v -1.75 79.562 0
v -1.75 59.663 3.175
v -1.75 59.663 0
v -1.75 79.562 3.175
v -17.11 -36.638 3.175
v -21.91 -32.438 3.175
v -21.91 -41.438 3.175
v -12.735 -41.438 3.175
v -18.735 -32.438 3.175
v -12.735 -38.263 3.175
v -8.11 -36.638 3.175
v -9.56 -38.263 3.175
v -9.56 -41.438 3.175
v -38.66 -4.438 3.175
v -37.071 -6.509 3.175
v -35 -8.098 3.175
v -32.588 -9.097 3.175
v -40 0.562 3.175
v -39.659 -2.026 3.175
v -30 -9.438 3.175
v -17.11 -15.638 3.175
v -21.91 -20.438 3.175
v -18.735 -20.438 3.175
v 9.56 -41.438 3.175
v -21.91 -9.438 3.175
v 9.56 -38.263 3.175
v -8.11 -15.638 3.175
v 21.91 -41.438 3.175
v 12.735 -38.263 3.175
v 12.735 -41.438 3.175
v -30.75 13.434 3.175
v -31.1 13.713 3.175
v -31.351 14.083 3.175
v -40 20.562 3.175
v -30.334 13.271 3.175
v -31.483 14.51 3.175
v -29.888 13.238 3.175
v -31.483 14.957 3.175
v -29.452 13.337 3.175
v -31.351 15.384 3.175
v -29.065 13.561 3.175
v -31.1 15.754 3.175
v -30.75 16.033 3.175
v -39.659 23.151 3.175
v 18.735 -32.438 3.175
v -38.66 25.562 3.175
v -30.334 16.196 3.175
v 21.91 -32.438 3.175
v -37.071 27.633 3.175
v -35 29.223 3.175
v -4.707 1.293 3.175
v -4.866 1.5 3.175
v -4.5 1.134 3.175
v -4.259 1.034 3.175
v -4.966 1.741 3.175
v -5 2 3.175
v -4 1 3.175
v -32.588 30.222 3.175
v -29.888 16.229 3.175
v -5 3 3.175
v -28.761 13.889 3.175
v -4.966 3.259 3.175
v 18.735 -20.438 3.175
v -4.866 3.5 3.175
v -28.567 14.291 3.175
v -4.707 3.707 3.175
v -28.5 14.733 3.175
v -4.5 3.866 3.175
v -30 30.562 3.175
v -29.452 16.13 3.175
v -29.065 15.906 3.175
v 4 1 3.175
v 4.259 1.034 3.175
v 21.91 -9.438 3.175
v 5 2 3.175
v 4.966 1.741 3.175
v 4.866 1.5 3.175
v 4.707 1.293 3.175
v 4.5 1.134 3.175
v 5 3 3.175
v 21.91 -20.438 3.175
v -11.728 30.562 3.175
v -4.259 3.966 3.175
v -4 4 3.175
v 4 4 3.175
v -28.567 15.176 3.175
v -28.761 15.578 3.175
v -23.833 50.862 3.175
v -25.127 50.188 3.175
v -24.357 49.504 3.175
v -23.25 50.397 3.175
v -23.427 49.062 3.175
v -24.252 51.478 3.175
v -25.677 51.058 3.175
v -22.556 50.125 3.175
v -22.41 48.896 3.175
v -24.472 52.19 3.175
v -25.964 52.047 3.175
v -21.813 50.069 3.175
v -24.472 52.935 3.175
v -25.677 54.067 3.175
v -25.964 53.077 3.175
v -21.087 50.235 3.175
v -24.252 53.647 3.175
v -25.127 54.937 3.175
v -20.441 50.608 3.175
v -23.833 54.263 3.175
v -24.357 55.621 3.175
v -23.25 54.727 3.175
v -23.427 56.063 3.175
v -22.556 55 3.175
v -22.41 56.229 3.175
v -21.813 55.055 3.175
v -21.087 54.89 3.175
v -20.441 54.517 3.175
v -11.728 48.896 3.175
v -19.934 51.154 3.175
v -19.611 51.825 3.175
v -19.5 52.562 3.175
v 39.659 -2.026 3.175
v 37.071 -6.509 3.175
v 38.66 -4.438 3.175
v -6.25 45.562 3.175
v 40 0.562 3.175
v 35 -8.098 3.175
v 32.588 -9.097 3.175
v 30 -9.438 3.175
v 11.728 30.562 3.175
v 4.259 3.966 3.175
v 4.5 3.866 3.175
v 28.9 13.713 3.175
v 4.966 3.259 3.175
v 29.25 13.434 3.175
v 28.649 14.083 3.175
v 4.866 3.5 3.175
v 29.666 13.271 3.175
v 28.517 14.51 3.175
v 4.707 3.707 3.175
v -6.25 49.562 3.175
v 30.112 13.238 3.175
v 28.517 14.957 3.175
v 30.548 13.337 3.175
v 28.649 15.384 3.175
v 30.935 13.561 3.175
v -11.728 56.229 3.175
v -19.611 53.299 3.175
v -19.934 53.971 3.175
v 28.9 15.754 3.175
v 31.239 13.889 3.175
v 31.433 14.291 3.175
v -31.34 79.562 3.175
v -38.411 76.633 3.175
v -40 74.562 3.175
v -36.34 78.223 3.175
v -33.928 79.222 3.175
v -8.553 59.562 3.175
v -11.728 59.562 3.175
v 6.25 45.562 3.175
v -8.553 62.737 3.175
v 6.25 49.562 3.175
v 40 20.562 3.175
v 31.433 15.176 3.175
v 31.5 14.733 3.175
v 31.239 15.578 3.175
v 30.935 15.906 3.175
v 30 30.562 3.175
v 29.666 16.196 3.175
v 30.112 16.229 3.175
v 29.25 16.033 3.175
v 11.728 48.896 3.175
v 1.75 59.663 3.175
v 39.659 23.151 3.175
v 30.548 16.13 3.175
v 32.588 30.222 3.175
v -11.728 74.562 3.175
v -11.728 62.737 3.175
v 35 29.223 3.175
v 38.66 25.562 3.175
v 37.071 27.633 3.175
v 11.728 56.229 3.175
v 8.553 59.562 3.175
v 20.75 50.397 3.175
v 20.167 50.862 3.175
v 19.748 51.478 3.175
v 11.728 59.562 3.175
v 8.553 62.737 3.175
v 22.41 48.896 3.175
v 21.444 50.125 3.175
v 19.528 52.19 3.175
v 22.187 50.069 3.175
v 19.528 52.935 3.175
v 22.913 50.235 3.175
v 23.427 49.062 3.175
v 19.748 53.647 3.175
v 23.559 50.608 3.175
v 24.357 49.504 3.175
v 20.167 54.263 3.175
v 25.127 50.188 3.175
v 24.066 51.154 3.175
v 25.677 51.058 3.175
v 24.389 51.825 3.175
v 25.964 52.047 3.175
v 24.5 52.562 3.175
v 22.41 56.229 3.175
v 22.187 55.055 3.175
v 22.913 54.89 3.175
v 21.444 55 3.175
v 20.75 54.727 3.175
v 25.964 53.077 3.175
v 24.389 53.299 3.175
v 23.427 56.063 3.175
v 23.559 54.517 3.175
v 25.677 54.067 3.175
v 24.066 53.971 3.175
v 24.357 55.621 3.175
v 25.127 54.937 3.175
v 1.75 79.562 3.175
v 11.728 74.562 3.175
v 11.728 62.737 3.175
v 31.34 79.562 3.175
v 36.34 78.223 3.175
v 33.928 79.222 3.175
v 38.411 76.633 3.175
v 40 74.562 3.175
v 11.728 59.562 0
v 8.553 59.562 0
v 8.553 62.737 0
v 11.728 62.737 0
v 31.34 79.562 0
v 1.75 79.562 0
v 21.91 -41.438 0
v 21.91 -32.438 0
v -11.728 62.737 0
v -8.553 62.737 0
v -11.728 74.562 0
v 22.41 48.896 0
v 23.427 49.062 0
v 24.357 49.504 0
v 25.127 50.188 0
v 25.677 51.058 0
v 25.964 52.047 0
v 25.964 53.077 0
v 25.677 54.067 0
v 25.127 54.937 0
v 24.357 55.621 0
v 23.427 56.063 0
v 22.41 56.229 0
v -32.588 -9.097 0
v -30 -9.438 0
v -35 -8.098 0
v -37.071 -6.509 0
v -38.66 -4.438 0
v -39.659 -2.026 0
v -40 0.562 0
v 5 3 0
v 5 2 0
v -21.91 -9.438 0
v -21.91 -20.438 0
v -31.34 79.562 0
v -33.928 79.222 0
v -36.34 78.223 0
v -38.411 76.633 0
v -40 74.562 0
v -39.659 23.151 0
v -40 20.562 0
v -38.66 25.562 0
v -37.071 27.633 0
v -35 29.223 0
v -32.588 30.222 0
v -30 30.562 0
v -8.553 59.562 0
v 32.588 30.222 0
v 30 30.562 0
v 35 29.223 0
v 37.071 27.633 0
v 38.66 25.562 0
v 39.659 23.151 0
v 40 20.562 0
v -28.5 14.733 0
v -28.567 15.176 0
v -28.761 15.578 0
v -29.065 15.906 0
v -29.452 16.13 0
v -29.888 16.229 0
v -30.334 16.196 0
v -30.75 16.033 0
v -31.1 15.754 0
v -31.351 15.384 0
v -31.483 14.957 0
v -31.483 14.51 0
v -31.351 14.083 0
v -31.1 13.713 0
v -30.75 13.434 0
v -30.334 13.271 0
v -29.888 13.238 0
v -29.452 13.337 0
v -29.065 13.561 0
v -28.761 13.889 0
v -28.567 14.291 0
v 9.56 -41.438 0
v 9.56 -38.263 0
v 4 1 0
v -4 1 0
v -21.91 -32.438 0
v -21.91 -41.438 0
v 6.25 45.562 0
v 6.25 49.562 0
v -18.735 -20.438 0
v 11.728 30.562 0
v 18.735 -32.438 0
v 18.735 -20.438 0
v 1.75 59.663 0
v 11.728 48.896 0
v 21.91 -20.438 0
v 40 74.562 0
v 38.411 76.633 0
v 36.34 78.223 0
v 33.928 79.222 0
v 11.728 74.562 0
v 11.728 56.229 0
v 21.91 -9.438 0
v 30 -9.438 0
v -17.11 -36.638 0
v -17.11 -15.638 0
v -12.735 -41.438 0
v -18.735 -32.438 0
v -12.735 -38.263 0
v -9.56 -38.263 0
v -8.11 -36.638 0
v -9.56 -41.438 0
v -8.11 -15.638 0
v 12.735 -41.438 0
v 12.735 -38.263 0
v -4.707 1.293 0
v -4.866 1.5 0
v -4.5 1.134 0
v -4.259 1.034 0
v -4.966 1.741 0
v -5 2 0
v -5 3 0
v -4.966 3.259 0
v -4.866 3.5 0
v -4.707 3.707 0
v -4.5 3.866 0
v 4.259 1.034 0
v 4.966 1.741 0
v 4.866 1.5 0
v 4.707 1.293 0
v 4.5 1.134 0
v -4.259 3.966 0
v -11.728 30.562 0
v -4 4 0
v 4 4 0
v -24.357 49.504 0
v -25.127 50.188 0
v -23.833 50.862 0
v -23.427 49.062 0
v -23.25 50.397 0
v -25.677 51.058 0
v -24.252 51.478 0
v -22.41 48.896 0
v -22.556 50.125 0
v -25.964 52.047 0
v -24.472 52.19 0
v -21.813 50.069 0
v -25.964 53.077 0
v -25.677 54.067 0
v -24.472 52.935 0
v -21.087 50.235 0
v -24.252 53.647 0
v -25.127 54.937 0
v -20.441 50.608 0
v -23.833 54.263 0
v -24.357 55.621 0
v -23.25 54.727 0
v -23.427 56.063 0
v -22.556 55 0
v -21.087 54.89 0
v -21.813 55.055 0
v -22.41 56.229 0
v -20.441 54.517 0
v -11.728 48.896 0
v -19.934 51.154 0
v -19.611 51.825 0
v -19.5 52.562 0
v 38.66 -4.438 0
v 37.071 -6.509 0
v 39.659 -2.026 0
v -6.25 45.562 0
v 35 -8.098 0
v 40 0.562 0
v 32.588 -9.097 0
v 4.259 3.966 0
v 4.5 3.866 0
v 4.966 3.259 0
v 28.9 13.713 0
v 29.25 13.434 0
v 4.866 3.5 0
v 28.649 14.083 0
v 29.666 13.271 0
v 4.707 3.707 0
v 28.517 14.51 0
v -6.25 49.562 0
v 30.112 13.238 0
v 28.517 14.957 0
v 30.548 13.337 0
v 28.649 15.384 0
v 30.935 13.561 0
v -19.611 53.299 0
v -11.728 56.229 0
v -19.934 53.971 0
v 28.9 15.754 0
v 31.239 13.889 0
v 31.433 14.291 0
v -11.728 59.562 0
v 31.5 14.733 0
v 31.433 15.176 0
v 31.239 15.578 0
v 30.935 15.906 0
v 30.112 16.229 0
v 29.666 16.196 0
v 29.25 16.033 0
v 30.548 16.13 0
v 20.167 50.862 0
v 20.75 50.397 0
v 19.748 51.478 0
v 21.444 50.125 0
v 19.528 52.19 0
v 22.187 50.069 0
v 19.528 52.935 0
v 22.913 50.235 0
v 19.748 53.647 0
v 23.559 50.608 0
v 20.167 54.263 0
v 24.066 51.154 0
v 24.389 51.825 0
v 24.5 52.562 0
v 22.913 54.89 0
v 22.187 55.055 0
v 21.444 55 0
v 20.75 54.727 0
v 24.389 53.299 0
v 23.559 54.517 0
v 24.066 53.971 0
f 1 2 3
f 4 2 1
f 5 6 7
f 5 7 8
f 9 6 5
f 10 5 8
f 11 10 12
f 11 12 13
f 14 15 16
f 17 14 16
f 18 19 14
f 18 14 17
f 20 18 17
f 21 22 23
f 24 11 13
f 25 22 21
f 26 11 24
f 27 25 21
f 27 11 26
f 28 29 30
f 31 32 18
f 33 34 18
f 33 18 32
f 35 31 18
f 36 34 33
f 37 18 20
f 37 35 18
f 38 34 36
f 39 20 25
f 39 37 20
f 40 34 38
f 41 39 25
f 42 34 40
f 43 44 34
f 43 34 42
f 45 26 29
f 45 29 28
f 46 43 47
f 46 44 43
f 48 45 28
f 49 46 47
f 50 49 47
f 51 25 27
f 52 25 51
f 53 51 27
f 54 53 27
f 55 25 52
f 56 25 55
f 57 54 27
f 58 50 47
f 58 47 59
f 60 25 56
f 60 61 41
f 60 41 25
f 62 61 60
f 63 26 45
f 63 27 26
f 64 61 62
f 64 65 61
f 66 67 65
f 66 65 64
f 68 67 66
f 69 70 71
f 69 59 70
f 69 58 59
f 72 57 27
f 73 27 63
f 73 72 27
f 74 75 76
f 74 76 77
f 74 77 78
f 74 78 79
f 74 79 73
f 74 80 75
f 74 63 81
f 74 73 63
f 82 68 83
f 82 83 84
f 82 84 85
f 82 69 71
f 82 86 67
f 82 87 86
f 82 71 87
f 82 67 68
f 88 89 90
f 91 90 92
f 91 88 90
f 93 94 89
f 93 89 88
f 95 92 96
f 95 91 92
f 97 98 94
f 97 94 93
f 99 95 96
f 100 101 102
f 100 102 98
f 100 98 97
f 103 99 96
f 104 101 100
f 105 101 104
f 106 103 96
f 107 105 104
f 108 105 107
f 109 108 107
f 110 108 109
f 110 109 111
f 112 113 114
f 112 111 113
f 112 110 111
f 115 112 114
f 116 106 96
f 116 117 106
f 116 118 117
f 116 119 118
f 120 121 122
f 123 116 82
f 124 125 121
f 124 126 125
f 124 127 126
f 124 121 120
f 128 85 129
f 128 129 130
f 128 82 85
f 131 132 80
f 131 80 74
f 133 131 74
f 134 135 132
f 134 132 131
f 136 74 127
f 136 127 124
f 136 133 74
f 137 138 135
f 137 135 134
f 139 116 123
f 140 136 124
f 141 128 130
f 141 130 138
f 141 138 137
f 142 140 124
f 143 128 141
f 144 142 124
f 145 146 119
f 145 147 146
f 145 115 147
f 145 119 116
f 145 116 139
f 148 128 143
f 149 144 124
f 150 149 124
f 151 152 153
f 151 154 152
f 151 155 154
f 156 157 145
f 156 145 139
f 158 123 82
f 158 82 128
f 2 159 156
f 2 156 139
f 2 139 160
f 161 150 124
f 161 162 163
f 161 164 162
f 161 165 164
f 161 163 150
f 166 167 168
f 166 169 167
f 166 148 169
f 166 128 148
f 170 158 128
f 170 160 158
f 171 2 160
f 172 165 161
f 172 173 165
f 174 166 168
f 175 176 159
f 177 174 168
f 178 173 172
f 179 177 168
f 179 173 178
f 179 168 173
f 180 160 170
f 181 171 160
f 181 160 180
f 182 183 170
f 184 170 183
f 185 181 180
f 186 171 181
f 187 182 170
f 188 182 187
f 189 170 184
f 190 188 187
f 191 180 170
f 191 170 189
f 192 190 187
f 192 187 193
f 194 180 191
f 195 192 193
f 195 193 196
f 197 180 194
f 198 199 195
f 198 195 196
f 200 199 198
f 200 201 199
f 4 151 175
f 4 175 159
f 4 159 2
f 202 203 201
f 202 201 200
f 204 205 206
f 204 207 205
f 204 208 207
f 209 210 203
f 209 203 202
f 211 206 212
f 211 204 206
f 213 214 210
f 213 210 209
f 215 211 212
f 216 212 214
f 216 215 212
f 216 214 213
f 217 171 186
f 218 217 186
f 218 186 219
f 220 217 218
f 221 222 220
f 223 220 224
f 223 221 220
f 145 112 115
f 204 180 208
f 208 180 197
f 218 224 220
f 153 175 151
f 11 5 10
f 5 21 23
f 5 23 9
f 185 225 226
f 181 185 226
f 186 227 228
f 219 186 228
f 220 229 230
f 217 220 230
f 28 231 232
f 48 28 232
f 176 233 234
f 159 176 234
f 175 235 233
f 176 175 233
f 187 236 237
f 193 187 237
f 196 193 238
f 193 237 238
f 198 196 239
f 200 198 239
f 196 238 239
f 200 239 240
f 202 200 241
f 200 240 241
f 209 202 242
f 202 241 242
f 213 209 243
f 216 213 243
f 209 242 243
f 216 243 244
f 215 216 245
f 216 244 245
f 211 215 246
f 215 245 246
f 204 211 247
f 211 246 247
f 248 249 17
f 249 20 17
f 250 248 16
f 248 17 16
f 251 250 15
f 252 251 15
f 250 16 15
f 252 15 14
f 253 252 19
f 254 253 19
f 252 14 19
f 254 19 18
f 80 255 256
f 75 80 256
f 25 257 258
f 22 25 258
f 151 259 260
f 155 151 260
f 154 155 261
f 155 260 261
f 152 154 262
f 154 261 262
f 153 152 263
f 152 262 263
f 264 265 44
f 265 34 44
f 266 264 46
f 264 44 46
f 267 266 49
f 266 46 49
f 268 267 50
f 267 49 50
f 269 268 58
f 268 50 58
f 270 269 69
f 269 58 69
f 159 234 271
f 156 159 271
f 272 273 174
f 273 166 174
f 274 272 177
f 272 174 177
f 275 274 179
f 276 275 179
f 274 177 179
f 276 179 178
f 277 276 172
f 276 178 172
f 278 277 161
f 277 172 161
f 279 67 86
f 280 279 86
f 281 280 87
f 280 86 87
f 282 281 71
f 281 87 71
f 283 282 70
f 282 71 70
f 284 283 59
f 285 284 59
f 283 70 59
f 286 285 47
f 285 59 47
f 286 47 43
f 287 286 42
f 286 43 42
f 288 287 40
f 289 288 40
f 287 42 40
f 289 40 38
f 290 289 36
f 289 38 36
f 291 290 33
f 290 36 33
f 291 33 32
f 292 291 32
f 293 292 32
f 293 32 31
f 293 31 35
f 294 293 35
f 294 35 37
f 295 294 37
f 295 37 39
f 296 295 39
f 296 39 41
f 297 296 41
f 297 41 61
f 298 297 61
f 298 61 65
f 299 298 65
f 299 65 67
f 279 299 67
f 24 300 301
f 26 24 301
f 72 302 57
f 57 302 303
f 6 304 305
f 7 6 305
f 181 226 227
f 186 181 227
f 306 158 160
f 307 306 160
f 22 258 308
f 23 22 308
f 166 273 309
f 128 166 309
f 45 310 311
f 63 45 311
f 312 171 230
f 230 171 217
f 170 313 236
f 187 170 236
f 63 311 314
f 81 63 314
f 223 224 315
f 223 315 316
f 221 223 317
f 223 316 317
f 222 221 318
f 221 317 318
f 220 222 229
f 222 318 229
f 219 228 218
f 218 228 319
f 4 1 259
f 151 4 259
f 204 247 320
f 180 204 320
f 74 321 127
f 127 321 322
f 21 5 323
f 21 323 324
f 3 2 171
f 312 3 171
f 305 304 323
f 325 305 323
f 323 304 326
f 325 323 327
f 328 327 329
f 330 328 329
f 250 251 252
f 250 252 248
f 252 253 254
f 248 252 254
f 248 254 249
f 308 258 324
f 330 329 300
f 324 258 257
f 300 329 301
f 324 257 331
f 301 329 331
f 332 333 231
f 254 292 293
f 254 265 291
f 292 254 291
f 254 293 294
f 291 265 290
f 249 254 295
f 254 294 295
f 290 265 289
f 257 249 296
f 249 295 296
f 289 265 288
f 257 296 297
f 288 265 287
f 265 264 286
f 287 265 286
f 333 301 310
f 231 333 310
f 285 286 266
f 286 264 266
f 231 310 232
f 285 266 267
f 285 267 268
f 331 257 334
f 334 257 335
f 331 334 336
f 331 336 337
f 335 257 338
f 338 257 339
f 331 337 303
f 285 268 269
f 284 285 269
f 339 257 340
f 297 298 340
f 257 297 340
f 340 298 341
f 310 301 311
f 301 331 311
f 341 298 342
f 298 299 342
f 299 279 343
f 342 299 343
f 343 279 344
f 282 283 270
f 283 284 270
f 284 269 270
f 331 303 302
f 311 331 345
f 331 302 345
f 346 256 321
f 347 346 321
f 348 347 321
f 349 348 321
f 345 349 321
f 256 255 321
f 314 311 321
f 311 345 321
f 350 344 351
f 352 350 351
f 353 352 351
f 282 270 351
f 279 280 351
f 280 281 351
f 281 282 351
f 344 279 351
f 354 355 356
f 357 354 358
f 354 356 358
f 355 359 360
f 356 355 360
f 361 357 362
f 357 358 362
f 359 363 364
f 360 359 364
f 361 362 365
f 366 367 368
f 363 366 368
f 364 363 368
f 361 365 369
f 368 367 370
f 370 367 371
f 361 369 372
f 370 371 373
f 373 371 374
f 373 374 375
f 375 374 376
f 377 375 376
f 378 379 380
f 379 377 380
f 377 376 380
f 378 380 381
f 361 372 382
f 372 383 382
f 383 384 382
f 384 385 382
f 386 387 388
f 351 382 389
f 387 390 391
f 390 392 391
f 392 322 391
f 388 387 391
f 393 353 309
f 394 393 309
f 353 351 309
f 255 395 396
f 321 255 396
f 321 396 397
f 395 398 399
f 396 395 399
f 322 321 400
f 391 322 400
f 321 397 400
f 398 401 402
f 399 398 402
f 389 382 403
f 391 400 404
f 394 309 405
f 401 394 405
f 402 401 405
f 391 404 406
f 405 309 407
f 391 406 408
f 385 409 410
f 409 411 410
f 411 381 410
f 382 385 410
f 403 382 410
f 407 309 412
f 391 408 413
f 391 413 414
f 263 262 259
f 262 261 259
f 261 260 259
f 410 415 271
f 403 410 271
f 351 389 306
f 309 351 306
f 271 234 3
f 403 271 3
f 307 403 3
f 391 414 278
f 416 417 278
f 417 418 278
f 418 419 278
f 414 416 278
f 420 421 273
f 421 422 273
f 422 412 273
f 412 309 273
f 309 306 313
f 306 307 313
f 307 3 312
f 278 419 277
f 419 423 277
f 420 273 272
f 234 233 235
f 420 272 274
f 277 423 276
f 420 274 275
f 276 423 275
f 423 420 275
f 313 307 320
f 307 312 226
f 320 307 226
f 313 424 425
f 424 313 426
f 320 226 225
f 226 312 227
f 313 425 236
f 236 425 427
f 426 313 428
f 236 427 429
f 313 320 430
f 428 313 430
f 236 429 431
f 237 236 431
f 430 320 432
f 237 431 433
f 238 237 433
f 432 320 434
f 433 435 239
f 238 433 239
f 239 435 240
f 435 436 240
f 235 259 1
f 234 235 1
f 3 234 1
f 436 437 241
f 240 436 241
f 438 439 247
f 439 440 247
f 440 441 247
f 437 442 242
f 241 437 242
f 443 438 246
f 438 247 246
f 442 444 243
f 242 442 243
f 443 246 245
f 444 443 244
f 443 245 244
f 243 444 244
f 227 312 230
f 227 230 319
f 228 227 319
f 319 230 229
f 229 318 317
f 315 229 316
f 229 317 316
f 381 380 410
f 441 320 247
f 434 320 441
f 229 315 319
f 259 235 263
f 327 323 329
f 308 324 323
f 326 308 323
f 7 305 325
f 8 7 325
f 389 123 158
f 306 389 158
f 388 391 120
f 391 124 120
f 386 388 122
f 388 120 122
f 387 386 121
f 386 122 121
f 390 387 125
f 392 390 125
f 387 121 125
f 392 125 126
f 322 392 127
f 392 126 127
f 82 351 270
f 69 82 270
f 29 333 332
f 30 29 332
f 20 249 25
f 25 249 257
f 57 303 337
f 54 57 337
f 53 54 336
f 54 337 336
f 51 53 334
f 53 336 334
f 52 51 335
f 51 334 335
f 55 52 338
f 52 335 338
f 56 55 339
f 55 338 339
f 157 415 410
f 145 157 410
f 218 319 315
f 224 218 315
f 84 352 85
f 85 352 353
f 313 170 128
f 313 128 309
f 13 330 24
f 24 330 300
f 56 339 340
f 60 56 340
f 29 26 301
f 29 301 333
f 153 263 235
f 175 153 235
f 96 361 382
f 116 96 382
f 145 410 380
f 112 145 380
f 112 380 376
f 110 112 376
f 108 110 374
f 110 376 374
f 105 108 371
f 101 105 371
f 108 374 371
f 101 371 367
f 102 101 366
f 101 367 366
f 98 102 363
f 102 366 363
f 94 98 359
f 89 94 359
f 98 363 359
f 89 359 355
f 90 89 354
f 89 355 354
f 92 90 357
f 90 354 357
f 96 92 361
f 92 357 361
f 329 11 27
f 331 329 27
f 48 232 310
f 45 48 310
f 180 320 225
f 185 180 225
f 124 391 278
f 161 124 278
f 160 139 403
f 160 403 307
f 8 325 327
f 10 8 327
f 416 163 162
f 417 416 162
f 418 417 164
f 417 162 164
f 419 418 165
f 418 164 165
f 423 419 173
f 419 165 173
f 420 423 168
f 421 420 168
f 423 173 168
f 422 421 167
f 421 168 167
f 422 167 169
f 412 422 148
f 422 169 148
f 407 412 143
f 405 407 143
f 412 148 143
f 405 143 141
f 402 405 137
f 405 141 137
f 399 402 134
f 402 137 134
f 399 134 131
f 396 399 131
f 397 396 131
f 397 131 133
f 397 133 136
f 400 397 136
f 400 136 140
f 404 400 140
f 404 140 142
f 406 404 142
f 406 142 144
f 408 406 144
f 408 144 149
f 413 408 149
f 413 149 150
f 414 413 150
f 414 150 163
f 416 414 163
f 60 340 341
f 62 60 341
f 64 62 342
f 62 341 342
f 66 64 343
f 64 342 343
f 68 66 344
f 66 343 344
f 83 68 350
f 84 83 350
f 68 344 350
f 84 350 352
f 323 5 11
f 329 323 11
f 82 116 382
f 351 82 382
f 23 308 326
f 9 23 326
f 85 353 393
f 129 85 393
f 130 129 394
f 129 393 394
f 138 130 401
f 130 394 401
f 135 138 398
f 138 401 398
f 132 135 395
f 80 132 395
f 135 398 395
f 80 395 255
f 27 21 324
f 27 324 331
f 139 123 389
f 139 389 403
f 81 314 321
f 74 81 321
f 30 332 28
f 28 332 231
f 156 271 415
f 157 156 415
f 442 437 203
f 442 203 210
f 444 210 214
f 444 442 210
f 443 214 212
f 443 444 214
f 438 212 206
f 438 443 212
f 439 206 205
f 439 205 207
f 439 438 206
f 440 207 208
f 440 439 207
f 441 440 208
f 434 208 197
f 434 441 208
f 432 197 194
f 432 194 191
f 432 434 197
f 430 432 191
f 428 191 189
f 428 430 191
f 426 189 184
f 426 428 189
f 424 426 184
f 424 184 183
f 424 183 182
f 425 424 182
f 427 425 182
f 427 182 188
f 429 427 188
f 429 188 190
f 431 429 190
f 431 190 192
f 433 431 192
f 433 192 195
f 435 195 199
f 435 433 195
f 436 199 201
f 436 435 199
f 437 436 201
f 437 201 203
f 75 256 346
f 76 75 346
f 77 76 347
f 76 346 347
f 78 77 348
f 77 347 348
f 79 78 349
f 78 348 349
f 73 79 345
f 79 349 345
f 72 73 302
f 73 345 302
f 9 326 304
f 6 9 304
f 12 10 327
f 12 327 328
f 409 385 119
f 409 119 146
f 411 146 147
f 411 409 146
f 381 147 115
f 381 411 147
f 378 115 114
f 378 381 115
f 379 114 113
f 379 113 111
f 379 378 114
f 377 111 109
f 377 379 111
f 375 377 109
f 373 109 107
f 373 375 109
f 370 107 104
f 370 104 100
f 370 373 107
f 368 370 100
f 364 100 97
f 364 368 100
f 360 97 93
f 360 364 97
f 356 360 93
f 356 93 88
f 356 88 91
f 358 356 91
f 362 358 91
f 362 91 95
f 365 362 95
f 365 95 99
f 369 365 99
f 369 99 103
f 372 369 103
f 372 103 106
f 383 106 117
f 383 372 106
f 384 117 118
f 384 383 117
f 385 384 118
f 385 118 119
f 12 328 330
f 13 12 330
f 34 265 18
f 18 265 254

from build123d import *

# Parameters (mm, degrees)
SKETCH1_R           = 2.5
BOSS_EXTRUDE1_DEPTH = 3.175
FILLET1_R           = 10
SKETCH2_W           = 9
SKETCH2_H           = 21
CUT_EXTRUDE1_DEPTH  = 90.108082017
SKETCH3_W           = 12.5
SKETCH3_H           = 4
SKETCH3_W_2         = 3.5
SKETCH3_H_2         = 20
CUT_EXTRUDE2_DEPTH  = 90.108082017
FILLET2_R           = 10
SKETCH4_W           = 3.175
SKETCH4_H           = 3.175
BOSS_EXTRUDE2_DEPTH = 29
SKETCH5_W           = 3.175
SKETCH5_H           = 3.175
BOSS_EXTRUDE3_DEPTH = 29
SKETCH7_R           = 1.5
CUT_EXTRUDE3_DEPTH  = 10


with BuildPart() as part:
    # Sketch1 → Boss-Extrude1 (new body)
    with BuildSketch(Plane.XY):
        with BuildLine():
            Line((-9.56, -38.262636689), (-9.56, -41.437636689))
            Line((-9.56, -41.437636689), (9.56, -41.437636689))
            Line((9.56, -41.437636689), (9.56, -38.262636689))
            Line((9.56, -38.262636689), (12.735, -38.262636689))
            Line((12.735, -38.262636689), (12.735, -41.437636689))
            Line((12.735, -41.437636689), (15.91, -41.437636689))
            Line((15.91, -41.437636689), (21.91, -41.437636689))
            Line((21.91, -41.437636689), (21.91, -32.437636689))
            Line((21.91, -32.437636689), (18.735, -32.437636689))
            Line((18.735, -32.437636689), (18.735, -20.437636689))
            Line((18.735, -20.437636689), (21.91, -20.437636689))
            Line((21.91, -20.437636689), (21.91, -9.437636689))
            Line((21.91, -9.437636689), (40, -9.437636689))
            Line((40, -9.437636689), (40, 30.562363311))
            Line((40, 30.562363311), (10, 30.562363311))
            Line((10, 30.562363311), (10, 45.562363311))
            Line((10, 45.562363311), (10, 48.89577614))
            Line((10, 48.89577614), (22.410269523, 48.89577614))
            ThreePointArc((22.410269523, 48.89577614), (26.000000001, 52.562363311), (22.410269523, 56.228950483))
            Line((22.410269523, 56.228950483), (11.727794547, 56.228950483))
            Line((11.727794547, 56.228950483), (11.727794547, 59.562363311))
            Line((11.727794547, 59.562363311), (10, 59.562363311))
            Line((10, 59.562363311), (8.552794547, 59.562363311))
            Line((8.552794547, 59.562363311), (8.552794547, 62.737363311))
            Line((8.552794547, 62.737363311), (11.727794547, 62.737363311))
            Line((11.727794547, 62.737363311), (11.727794547, 74.562363311))
            Line((11.727794547, 74.562363311), (40, 74.562363311))
            Line((40, 74.562363311), (40, 79.562363311))
            Line((40, 79.562363311), (0, 79.562363311))
            Line((0, 79.562363311), (-40, 79.562363311))
            Line((-40, 79.562363311), (-40, 74.562363311))
            Line((-40, 74.562363311), (-11.727794547, 74.562363311))
            Line((-11.727794547, 74.562363311), (-11.727794547, 62.737363311))
            Line((-11.727794547, 62.737363311), (-8.552794547, 62.737363311))
            Line((-8.552794547, 62.737363311), (-8.552794547, 59.562363311))
            Line((-8.552794547, 59.562363311), (-10, 59.562363311))
            Line((-10, 59.562363311), (-11.727794547, 59.562363311))
            Line((-11.727794547, 59.562363311), (-11.727794547, 56.228950483))
            Line((-11.727794547, 56.228950483), (-22.410269523, 56.228950483))
            ThreePointArc((-22.410269523, 56.228950483), (-26.000000001, 52.562363311), (-22.410269523, 48.89577614))
            Line((-22.410269523, 48.89577614), (-10, 48.89577614))
            Line((-10, 48.89577614), (-10, 45.562363311))
            Line((-10, 45.562363311), (-10, 30.562363311))
            Line((-10, 30.562363311), (-40, 30.562363311))
            Line((-40, 30.562363311), (-40, -9.437636689))
            Line((-40, -9.437636689), (-21.91, -9.437636689))
            Line((-21.91, -9.437636689), (-21.91, -20.437636689))
            Line((-21.91, -20.437636689), (-18.735, -20.437636689))
            Line((-18.735, -20.437636689), (-18.735, -32.437636689))
            Line((-18.735, -32.437636689), (-21.91, -32.437636689))
            Line((-21.91, -32.437636689), (-21.91, -41.437636689))
            Line((-21.91, -41.437636689), (-15.91, -41.437636689))
            Line((-15.91, -41.437636689), (-12.735, -41.437636689))
            Line((-12.735, -41.437636689), (-12.735, -38.262636689))
            Line((-12.735, -38.262636689), (-9.56, -38.262636689))
        make_face()
        with BuildLine():
            Line((4, 1), (-4, 1))
            ThreePointArc((-4, 1), (-4.707106781, 1.292893219), (-5, 2))
            Line((-5, 2), (-5, 3))
            ThreePointArc((-5, 3), (-4.707106781, 3.707106781), (-4, 4))
            Line((-4, 4), (4, 4))
            ThreePointArc((4, 4), (4.707106781, 3.707106781), (5, 3))
            Line((5, 3), (5, 2))
            ThreePointArc((5, 2), (4.707106781, 1.292893219), (4, 1))
        make_face(mode=Mode.SUBTRACT)
        with Locations((-22, 52.562363311)):
            Circle(SKETCH1_R, mode=Mode.SUBTRACT)
        with Locations((22, 52.562363311)):
            Circle(SKETCH1_R, mode=Mode.SUBTRACT)
    extrude(amount=BOSS_EXTRUDE1_DEPTH)

    # Fillet1
    # the kernel refuses this fillet: 10 mm, written as the material it takes off along each edge
    with BuildSketch(Plane(origin=(-40, 79.562363311, -21.650635095), x_dir=(0, -1, 0), z_dir=(0, 0, 1))) as fillet1_piece_1:
        with BuildLine():
            CenterArc((10, 8.660254038), FILLET1_R, 180, 60)
            Line((0, 8.660254038), (-0.2, 8.660254038))
            Line((-0.2, 8.660254038), (-0.2, 0))
            Line((-0.2, 0), (0, -0.2))
            ThreePointArc((0, -0.2), (2.5, -0.2), (4.9, -0.173205081))
            Line((4.9, -0.173205081), (5, 0))
        make_face()
    extrude(amount=46.476270189, mode=Mode.SUBTRACT)
    with BuildSketch(Plane(origin=(40, 79.562363311, -21.650635095), x_dir=(-1, 0, 0), z_dir=(0, 0, 1))) as fillet1_piece_2:
        with BuildLine():
            CenterArc((8.660254038, 10), FILLET1_R, 210, 60)
            Line((0, 5), (-0.173205081, 4.9))
            ThreePointArc((-0.173205081, 4.9), (-0.2, 2.5), (-0.2, 0))
            Line((-0.2, 0), (0, -0.2))
            Line((0, -0.2), (8.660254038, -0.2))
            Line((8.660254038, -0.2), (8.660254038, 0))
        make_face()
    extrude(amount=46.476270189, mode=Mode.SUBTRACT)

    # Sketch2 → Cut-Extrude1 (cut, through all)
    with BuildSketch(Plane.XY.offset(3.175)):
        with Locations((-12.61, -26.137636689)):
            Rectangle(SKETCH2_W, SKETCH2_H)
    extrude(amount=-CUT_EXTRUDE1_DEPTH, mode=Mode.SUBTRACT)

    # Sketch3 → Cut-Extrude2 (cut, through all)
    with BuildSketch(Plane.XY.offset(3.175)):
        with Locations((0, 47.562363311)):
            Rectangle(SKETCH3_W, SKETCH3_H)
        with Locations((0, 69.663077344)):
            Rectangle(SKETCH3_W_2, SKETCH3_H_2)
    extrude(amount=-CUT_EXTRUDE2_DEPTH, mode=Mode.SUBTRACT)

    # Fillet2
    fillet2_edges = [part.edges().sort_by_distance(p)[0] for p in [
        (40, 30.562363311, 1.5875),
        (40, -9.437636689, 1.5875),
        (-40, -9.437636689, 1.5875),
        (-40, 30.562363311, 1.5875),
    ]]
    fillet(fillet2_edges, radius=FILLET2_R)

    # Sketch4 → Boss-Extrude2 (add)
    with BuildSketch(Plane(origin=(0, 59.562363311, 0), x_dir=(1, 0, 0), z_dir=(0, 1, 0))):
        with Locations((10.140294547, -1.5875)):
            Rectangle(SKETCH4_W, SKETCH4_H)
    extrude(amount=-BOSS_EXTRUDE2_DEPTH)

    # Sketch5 → Boss-Extrude3 (add)
    with BuildSketch(Plane(origin=(0, 59.562363311, 0), x_dir=(1, 0, 0), z_dir=(0, 1, 0))):
        with Locations((-10.140294547, -1.5875)):
            Rectangle(SKETCH5_W, SKETCH5_H)
    extrude(amount=-BOSS_EXTRUDE3_DEPTH)

    # Sketch7 → Cut-Extrude3 (cut)
    with BuildSketch(Plane.XY.offset(3.175)):
        with Locations((-30, 14.733489054)):
            Circle(SKETCH7_R)
        with Locations((30, 14.733489054)):
            Circle(SKETCH7_R)
    extrude(amount=-CUT_EXTRUDE3_DEPTH, mode=Mode.SUBTRACT)


solid = part.part
